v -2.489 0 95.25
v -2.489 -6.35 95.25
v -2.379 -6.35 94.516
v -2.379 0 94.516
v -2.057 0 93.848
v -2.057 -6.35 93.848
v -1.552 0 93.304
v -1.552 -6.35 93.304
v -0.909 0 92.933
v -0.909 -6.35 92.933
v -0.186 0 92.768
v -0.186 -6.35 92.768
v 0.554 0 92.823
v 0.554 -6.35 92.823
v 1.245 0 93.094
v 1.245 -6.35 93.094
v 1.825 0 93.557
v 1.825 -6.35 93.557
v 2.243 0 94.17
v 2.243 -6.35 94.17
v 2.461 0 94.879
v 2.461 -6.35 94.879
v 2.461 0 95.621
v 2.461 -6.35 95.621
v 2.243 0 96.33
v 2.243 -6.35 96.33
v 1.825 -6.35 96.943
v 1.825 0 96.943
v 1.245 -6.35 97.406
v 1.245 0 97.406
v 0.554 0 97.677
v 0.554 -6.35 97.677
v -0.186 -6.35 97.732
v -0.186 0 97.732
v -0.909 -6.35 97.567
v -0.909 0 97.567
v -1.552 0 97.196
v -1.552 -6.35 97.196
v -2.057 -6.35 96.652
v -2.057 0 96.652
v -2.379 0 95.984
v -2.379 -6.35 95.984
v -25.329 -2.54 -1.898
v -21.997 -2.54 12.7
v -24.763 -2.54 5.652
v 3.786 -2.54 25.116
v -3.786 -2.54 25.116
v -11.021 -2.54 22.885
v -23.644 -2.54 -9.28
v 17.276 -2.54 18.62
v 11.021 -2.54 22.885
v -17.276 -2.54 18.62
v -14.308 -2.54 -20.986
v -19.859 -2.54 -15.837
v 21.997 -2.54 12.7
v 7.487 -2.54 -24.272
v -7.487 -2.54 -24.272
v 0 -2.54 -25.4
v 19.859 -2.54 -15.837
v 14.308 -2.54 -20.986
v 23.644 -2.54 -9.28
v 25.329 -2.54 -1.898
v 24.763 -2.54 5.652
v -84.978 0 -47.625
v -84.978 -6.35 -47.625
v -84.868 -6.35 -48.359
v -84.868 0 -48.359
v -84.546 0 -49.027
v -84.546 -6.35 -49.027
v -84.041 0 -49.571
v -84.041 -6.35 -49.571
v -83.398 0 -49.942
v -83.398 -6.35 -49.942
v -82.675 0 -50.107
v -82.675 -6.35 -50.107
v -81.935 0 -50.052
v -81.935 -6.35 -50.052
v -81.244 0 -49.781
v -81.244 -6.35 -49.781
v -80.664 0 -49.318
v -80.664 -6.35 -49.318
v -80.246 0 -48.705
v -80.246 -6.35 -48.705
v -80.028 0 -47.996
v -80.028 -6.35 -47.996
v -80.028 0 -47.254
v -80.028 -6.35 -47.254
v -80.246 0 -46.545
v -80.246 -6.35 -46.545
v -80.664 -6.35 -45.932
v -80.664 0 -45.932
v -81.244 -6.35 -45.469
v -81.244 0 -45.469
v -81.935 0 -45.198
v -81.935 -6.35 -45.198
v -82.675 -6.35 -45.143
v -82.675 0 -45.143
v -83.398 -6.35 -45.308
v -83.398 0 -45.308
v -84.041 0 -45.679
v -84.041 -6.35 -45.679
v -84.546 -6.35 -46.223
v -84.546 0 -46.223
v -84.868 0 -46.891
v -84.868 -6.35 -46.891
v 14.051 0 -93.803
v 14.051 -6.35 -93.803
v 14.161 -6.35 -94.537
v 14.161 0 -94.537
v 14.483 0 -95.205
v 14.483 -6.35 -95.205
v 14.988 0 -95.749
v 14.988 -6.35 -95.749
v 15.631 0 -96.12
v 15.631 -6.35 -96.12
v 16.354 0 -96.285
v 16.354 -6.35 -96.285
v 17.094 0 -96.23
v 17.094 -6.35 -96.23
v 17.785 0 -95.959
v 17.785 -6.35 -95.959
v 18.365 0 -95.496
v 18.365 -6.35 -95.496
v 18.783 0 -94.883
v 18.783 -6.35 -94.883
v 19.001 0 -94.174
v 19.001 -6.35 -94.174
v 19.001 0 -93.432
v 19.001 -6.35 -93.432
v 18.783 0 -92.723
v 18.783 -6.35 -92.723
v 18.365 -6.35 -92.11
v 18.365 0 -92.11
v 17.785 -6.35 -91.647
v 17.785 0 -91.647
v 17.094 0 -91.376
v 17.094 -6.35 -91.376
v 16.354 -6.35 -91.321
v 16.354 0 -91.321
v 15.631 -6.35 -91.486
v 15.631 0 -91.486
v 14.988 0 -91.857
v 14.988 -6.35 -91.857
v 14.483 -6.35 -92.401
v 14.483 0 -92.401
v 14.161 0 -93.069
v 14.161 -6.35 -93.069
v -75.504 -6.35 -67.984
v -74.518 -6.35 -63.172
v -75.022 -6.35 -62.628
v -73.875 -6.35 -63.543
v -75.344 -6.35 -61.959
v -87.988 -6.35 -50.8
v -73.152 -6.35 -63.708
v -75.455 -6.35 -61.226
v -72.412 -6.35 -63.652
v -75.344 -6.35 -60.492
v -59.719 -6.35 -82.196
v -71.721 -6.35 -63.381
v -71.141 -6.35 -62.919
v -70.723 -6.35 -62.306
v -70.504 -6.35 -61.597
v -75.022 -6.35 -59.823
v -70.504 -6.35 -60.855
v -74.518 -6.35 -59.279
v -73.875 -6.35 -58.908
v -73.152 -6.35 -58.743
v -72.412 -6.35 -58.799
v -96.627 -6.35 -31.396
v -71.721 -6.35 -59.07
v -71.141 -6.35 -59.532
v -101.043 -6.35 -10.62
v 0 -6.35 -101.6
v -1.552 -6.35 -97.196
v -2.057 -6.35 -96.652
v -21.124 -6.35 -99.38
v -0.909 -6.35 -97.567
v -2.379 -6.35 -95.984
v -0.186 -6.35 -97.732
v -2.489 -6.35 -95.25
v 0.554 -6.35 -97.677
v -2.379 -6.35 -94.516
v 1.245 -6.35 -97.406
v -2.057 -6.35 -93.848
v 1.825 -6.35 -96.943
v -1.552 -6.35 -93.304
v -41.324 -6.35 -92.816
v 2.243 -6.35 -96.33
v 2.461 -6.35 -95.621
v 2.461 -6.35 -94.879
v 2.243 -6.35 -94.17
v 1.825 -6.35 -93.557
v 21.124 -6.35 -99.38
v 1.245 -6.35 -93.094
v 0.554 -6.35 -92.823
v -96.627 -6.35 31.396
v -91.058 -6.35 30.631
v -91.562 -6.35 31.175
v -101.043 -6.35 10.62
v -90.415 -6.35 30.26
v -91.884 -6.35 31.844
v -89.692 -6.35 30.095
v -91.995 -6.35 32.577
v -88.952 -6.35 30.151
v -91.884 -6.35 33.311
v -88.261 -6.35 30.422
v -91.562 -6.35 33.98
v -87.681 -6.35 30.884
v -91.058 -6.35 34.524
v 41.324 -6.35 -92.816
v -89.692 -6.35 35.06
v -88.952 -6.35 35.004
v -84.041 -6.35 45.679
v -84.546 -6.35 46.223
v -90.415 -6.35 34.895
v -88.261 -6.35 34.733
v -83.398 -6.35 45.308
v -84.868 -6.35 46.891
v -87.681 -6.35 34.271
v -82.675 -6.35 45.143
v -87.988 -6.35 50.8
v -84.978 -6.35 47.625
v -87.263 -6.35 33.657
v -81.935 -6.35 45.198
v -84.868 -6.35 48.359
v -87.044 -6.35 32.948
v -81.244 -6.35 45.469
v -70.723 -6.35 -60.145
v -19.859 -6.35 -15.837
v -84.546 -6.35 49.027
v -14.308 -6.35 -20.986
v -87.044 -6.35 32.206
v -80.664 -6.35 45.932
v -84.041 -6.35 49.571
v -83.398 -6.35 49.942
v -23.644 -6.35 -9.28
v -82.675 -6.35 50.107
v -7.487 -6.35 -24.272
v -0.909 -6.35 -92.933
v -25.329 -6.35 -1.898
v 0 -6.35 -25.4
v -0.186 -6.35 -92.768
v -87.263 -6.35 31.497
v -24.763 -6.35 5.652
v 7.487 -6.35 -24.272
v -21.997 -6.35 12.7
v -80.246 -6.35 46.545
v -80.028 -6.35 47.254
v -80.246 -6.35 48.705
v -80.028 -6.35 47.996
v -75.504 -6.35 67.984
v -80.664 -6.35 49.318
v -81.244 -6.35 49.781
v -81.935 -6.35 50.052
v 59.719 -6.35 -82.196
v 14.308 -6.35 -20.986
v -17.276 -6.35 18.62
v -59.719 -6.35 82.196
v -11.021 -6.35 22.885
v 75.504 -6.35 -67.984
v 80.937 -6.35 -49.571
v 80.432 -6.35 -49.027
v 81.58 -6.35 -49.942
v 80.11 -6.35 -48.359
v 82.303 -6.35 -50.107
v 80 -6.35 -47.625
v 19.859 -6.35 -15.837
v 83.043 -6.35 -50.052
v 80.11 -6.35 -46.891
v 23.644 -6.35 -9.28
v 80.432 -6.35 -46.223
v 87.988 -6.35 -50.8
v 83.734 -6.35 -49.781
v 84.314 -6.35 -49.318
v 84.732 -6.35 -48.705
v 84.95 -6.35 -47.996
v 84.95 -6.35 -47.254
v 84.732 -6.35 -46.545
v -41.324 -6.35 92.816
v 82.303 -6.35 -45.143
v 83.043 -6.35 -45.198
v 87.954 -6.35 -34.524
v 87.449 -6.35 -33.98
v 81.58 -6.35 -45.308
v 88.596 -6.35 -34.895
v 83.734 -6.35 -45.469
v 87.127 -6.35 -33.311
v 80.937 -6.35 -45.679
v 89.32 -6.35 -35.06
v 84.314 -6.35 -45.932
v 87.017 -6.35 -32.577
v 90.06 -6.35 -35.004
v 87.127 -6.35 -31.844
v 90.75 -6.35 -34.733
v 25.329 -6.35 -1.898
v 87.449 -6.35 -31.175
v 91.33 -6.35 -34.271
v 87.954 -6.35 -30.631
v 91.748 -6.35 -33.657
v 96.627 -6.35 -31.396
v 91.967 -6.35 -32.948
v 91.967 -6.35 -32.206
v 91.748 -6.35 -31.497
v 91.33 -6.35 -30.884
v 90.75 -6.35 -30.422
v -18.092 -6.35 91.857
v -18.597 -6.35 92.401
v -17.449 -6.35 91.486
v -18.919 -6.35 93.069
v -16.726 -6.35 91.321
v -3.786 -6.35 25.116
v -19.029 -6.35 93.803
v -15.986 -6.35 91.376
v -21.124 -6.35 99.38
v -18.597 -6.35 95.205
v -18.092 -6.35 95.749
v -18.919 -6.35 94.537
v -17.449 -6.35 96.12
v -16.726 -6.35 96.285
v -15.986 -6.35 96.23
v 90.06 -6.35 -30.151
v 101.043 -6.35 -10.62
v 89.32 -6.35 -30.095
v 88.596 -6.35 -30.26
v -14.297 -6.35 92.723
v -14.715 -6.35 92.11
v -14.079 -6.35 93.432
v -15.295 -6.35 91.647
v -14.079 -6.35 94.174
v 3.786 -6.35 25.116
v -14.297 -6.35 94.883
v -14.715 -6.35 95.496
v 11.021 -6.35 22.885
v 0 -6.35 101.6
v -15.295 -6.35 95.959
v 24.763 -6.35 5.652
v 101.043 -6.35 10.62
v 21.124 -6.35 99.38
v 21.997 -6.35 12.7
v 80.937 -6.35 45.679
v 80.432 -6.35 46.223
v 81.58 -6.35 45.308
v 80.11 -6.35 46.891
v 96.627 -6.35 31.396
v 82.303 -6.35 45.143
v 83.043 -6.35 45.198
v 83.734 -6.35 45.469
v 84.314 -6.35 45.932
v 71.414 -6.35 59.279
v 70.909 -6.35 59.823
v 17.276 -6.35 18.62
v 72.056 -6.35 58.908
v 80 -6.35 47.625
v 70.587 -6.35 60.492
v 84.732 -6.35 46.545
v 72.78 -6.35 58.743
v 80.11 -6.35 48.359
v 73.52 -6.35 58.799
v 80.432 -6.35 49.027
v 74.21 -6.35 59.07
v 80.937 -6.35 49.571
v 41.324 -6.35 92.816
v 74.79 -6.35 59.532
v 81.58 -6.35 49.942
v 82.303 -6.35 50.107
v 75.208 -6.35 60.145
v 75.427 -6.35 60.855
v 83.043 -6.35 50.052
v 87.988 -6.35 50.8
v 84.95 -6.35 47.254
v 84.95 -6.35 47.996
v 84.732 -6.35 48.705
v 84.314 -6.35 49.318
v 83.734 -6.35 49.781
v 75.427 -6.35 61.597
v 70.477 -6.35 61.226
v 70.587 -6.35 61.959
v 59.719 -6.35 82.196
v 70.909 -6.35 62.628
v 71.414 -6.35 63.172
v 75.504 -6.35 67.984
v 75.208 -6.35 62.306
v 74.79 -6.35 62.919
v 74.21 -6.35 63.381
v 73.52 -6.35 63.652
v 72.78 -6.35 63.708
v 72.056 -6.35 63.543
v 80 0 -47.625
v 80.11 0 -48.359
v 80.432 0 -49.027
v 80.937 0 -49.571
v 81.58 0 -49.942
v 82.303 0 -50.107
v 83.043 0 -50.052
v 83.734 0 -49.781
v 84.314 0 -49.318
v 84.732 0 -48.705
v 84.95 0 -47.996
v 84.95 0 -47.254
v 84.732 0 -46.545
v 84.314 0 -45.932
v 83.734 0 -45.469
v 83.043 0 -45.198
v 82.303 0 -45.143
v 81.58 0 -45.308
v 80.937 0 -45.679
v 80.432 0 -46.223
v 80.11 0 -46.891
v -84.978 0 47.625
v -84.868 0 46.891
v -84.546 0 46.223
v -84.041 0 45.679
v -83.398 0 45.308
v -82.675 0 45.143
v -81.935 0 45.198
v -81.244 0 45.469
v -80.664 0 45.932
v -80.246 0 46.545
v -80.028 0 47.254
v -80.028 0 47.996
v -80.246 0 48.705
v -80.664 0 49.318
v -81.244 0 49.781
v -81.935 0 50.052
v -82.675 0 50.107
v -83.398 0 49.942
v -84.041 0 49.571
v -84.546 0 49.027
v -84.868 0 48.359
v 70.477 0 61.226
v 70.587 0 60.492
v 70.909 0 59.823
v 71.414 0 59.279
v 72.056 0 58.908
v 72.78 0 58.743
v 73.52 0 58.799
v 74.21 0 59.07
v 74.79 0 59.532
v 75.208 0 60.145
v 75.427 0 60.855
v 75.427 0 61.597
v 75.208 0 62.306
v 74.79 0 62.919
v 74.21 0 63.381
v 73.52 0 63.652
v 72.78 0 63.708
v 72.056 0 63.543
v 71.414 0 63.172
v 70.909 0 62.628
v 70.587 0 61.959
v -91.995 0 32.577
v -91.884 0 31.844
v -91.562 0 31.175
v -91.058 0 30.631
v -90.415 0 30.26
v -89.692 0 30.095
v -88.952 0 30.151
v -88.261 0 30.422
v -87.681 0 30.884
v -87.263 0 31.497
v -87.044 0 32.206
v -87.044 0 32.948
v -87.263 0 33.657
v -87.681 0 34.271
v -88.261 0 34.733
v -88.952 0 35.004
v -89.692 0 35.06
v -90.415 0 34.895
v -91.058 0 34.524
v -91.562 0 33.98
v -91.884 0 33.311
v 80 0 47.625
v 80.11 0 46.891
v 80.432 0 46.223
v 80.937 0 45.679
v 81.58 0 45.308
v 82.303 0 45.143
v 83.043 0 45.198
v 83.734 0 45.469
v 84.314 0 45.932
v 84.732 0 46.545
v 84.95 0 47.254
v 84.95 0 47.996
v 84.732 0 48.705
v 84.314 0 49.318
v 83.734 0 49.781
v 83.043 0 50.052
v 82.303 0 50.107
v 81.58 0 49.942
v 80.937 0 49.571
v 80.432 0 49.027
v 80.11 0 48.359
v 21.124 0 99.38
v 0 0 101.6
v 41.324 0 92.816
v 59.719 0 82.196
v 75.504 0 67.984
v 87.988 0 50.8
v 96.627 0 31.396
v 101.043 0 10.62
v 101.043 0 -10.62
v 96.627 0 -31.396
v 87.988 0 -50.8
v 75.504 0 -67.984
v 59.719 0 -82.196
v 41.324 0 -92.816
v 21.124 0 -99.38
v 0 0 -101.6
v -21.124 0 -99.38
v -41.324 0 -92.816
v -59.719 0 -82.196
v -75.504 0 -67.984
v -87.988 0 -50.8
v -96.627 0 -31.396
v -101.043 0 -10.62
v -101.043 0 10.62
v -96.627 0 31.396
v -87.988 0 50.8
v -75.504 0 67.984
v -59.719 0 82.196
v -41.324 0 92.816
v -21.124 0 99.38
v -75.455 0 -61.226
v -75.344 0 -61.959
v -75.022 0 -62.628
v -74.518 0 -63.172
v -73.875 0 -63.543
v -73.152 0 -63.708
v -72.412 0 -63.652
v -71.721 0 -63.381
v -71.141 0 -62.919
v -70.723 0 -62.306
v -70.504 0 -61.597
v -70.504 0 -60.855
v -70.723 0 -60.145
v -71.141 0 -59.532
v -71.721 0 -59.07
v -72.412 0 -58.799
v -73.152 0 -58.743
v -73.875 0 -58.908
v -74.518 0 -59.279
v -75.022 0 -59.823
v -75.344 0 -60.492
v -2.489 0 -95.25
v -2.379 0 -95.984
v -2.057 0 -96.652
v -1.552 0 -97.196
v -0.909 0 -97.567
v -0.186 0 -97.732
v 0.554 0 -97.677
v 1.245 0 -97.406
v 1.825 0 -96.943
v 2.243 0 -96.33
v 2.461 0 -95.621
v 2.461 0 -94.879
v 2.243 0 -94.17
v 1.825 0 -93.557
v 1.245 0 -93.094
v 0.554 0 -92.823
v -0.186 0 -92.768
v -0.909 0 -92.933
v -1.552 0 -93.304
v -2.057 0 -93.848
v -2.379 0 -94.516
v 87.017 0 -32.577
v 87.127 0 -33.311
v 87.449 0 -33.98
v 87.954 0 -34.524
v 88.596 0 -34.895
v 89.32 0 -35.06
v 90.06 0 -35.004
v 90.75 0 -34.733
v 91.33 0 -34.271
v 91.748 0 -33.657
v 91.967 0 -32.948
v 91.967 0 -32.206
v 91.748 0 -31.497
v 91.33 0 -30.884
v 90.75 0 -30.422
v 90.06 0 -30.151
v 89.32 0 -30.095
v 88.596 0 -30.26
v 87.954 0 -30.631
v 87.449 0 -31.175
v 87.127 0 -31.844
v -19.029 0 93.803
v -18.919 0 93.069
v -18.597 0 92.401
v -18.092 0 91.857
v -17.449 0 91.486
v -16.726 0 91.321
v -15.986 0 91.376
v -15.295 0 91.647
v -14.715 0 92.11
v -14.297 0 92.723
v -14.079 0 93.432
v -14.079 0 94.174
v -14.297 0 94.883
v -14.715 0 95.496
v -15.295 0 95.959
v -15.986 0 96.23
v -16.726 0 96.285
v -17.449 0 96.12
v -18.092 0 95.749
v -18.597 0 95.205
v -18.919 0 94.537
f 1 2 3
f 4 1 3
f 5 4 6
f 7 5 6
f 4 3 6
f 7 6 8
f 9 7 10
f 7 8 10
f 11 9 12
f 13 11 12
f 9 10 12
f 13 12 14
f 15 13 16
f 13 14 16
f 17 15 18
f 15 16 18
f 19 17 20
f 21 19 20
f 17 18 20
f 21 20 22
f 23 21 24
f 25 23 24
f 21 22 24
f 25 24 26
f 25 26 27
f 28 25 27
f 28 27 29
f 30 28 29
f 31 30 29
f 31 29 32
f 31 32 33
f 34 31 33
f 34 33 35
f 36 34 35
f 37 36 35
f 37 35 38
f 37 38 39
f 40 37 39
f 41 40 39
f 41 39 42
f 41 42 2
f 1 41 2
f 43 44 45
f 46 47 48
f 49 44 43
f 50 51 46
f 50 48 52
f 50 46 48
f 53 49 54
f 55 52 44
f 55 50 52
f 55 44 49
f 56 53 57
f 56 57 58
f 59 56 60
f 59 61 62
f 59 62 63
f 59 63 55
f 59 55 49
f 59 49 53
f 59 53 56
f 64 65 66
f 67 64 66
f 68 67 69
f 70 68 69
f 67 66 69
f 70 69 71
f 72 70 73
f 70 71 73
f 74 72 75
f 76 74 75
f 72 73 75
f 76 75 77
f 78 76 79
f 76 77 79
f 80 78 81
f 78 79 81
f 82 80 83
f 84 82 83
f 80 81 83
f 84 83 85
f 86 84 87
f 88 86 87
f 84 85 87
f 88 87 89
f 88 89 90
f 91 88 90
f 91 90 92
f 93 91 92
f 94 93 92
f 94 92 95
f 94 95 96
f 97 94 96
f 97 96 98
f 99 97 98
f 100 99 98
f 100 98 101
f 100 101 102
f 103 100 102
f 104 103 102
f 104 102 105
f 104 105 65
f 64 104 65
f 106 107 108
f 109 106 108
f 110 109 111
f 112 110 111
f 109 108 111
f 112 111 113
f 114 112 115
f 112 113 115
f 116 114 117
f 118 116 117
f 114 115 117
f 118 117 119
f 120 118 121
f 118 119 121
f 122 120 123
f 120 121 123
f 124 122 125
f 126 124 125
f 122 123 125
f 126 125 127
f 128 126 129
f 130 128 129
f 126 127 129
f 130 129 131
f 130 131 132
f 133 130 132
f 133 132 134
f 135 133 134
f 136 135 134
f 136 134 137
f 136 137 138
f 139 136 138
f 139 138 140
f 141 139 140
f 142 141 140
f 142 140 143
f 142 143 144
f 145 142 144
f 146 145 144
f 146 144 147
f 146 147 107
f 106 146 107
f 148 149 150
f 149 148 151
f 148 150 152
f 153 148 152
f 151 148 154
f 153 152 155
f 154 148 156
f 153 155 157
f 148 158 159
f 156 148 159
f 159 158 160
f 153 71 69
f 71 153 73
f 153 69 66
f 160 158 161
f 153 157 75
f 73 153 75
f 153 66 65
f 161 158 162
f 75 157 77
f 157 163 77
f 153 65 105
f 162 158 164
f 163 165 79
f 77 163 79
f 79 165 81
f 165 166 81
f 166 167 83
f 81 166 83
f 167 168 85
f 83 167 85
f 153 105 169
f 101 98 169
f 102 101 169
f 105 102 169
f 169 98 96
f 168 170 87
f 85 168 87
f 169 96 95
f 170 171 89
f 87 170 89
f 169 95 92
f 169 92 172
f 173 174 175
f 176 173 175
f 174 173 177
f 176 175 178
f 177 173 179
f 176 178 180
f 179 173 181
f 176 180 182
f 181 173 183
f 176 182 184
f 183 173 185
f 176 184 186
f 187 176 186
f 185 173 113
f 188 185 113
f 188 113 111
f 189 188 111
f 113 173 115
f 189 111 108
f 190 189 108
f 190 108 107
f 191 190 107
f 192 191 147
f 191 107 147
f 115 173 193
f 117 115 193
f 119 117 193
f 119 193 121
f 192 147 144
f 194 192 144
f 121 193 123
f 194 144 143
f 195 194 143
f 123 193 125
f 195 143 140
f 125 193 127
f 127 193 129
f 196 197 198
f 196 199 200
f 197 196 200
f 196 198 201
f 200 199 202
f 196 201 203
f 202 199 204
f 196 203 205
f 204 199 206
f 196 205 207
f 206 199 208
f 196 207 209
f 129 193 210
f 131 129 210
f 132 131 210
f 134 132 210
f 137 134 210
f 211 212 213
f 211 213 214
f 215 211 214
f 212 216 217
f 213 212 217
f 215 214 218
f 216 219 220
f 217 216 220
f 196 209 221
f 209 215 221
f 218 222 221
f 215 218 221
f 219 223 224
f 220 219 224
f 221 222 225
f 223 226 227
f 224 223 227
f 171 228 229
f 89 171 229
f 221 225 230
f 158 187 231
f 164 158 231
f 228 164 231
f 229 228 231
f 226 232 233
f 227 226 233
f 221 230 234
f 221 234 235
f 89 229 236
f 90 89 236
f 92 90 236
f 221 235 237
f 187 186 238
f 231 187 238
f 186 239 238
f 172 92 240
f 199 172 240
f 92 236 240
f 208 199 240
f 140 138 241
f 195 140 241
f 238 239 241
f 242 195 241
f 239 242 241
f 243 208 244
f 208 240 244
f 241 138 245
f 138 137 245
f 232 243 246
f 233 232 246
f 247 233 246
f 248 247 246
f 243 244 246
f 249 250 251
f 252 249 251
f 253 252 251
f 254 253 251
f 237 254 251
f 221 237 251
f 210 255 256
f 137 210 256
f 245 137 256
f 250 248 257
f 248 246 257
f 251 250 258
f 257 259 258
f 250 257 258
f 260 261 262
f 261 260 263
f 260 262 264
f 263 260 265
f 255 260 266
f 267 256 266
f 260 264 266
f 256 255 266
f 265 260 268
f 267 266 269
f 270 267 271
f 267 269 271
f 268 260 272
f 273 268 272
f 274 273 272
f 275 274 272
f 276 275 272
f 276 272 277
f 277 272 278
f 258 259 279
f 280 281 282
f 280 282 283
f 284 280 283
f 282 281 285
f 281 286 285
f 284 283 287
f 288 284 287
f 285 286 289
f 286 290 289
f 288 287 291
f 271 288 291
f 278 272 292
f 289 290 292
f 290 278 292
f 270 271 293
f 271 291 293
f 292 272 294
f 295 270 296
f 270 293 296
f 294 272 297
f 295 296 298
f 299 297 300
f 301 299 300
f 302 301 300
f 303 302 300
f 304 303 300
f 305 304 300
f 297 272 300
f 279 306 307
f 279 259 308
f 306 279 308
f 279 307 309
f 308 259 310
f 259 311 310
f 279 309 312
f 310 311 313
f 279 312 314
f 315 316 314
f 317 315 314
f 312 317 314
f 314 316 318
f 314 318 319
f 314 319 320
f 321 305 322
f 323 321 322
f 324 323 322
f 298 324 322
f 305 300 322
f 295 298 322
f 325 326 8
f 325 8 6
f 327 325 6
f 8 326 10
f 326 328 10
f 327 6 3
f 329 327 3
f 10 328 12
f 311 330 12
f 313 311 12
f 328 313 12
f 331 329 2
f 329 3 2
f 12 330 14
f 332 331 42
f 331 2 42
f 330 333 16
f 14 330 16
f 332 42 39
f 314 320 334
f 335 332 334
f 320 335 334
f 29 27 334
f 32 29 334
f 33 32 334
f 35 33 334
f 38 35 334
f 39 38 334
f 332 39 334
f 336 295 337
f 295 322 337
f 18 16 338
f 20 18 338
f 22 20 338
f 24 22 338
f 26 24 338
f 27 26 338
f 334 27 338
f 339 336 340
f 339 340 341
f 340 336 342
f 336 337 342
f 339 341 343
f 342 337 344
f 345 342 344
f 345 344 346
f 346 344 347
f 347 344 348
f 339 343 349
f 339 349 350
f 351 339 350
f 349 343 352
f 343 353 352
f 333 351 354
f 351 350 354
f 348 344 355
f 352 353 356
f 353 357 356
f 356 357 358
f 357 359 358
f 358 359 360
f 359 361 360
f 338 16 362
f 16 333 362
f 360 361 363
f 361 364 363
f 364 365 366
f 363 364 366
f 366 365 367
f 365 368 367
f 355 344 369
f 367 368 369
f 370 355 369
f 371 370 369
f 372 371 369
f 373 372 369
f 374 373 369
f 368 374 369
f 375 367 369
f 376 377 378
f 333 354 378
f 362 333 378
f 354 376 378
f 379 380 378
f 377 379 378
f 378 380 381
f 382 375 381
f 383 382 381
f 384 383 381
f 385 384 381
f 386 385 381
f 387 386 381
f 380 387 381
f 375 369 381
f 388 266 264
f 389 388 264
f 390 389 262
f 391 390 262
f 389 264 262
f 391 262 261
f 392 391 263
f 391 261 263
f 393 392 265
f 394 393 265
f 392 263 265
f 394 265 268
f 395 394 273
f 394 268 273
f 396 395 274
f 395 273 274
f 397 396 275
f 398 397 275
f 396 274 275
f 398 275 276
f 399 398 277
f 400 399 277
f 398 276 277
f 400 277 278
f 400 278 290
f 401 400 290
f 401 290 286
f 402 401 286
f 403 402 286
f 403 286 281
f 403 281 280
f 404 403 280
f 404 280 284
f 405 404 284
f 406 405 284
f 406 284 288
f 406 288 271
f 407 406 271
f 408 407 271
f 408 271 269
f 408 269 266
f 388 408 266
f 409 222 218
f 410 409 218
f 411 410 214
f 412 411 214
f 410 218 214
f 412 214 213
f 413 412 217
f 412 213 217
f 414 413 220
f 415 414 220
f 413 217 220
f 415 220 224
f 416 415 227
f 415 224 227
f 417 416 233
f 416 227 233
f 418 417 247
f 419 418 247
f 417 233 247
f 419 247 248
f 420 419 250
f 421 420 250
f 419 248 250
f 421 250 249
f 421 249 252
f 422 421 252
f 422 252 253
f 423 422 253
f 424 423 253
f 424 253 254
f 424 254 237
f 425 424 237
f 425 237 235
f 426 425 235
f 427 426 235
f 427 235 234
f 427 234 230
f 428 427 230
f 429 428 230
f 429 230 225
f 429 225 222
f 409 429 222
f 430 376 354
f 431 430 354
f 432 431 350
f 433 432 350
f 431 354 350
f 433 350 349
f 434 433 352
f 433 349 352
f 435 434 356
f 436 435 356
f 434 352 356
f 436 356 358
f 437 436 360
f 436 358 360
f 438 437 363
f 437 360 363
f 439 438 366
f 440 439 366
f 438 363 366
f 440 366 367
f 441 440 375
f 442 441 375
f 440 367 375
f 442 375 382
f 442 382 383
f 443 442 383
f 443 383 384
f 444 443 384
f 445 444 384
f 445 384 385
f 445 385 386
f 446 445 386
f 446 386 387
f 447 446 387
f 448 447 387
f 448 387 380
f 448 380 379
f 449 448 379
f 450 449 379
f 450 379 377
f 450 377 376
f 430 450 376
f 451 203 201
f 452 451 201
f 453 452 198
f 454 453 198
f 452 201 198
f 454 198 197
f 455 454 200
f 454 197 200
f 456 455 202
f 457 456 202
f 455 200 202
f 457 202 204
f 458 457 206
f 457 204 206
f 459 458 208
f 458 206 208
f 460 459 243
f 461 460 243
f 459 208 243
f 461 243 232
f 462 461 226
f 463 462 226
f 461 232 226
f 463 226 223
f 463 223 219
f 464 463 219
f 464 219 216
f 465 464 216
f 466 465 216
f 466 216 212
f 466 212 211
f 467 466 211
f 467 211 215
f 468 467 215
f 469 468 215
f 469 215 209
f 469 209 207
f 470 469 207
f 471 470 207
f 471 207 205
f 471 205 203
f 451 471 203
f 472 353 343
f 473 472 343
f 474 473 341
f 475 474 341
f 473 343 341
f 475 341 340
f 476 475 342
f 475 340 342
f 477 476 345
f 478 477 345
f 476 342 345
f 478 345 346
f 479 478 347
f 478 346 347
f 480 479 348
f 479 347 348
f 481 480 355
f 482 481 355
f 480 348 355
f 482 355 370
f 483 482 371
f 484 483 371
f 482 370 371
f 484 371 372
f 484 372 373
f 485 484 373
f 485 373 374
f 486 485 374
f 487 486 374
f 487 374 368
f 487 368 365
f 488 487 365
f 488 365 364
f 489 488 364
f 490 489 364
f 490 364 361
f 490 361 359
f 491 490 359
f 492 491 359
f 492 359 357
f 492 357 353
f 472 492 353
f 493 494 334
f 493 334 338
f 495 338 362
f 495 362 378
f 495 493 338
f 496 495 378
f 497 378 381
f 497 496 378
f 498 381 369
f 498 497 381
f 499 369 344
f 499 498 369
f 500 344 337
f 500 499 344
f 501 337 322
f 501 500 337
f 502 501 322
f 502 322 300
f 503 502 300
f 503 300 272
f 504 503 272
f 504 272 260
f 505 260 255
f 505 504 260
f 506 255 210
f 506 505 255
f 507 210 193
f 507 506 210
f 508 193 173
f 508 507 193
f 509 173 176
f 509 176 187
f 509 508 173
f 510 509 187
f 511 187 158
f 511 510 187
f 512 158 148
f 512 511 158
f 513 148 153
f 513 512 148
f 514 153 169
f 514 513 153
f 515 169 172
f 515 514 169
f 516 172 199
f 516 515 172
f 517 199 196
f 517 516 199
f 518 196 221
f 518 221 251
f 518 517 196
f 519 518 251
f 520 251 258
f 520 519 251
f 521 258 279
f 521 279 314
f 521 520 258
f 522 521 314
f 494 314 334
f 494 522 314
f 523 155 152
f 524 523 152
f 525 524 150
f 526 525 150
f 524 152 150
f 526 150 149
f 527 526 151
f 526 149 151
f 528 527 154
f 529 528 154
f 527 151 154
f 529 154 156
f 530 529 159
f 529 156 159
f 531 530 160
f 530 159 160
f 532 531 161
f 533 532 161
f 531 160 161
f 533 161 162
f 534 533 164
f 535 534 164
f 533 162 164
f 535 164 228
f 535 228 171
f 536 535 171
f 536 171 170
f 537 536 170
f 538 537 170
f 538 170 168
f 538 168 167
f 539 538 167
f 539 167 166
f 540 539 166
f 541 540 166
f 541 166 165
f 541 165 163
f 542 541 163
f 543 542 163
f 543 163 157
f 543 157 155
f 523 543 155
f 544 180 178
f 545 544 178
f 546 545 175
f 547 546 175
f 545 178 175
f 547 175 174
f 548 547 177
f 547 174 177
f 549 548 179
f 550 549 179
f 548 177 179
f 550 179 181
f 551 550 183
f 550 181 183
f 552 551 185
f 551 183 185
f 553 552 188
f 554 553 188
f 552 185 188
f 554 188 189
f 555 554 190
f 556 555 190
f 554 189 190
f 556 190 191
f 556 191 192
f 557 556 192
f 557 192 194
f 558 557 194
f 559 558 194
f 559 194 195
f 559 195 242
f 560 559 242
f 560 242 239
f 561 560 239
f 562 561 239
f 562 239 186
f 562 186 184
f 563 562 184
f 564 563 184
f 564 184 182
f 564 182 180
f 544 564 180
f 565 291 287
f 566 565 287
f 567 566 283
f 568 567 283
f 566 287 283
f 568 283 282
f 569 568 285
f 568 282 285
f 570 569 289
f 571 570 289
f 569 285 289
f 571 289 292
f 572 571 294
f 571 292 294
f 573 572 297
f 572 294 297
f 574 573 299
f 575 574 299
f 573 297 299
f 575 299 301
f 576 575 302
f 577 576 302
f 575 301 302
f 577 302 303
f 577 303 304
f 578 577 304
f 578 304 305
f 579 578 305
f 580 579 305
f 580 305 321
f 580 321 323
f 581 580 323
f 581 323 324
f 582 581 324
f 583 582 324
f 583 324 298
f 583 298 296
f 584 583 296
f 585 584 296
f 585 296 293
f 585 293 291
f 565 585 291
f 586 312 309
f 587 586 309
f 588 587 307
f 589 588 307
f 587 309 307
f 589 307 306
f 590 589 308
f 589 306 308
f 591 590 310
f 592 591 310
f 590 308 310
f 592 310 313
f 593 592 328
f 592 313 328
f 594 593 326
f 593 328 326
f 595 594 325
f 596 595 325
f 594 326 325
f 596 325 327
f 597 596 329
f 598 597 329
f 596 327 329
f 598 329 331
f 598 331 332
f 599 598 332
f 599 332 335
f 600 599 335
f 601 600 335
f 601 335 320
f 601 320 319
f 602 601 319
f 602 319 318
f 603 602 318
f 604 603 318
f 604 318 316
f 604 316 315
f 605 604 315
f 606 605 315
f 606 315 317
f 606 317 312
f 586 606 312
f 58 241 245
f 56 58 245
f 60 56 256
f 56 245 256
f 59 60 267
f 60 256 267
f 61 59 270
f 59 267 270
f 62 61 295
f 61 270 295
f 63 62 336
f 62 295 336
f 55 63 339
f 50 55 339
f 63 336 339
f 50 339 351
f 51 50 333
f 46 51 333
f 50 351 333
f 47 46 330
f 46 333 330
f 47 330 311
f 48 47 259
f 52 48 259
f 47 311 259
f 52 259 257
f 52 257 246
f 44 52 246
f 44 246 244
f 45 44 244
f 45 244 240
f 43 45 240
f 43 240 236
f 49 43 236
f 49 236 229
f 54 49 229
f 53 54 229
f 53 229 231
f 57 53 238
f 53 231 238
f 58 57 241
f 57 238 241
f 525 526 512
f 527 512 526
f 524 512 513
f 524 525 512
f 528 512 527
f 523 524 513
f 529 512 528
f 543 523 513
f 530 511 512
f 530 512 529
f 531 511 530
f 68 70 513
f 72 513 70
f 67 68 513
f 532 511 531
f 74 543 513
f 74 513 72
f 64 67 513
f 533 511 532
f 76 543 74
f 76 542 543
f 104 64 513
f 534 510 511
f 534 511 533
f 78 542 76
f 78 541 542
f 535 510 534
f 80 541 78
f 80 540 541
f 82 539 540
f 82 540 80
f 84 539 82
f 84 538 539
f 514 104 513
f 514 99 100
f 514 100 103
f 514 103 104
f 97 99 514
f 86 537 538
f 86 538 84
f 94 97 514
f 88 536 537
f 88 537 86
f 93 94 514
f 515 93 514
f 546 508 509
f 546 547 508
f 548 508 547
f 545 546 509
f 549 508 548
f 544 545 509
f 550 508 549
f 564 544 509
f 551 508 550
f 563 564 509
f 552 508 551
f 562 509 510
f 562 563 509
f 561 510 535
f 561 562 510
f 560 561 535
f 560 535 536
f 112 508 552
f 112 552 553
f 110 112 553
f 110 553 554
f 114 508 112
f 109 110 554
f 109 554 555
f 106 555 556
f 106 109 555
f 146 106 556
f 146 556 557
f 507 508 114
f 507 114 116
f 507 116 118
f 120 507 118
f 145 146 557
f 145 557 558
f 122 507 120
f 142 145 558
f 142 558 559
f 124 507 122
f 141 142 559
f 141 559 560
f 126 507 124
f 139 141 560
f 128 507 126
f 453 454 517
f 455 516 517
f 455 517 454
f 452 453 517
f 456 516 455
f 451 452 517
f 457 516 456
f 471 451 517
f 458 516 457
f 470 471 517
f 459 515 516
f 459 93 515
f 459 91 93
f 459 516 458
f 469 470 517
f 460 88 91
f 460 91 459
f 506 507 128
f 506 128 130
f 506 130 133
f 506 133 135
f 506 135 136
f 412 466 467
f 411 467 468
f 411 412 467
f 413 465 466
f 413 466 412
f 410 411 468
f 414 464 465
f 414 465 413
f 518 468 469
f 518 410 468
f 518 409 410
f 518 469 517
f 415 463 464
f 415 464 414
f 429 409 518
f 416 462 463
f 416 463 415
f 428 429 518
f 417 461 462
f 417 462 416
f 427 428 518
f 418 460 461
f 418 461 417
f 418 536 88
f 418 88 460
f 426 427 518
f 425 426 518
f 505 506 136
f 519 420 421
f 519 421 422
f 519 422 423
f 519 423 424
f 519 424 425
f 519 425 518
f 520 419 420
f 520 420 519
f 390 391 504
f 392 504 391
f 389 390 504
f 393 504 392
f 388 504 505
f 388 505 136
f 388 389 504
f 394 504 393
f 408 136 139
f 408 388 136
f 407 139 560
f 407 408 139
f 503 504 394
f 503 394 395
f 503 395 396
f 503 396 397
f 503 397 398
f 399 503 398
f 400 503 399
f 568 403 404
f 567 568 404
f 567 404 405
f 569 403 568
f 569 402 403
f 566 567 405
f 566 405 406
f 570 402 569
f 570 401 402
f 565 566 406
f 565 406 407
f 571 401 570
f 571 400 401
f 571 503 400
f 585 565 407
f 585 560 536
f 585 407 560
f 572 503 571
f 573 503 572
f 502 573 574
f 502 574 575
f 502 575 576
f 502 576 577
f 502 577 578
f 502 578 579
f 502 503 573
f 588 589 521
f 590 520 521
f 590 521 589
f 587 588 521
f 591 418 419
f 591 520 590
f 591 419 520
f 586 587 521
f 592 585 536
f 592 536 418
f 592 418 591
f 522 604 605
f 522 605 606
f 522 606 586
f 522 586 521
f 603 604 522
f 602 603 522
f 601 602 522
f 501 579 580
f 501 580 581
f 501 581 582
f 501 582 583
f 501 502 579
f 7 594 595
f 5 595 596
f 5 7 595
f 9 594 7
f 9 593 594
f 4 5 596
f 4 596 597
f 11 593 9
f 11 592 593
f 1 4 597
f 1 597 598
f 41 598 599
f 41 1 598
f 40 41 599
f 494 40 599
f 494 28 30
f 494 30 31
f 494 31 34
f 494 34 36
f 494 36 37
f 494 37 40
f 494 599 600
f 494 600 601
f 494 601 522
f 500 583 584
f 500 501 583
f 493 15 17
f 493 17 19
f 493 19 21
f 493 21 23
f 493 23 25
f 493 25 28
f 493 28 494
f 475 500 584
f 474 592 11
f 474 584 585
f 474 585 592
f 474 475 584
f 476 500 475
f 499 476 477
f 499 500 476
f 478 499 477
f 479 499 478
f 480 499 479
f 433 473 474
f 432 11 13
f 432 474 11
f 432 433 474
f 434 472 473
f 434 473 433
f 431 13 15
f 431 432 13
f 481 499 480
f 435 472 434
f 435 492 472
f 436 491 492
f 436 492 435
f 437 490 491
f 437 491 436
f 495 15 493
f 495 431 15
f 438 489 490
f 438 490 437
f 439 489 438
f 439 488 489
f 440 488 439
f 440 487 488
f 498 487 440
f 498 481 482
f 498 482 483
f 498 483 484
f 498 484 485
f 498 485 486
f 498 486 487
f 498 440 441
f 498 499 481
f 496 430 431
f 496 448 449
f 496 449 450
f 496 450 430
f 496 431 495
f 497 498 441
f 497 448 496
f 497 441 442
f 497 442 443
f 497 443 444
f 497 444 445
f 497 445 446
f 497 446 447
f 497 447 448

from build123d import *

# Parameters (mm, degrees)
BACK_PLATE_MAIN_R          = 101.6
BOSS_EXTRUDE1_DEPTH        = 6.35
F_9_0_196_DIAMETER_HOLE1_D = 4.9784
CLEARANCE_CUTOUT_R         = 25.4
CUT_EXTRUDE1_DEPTH         = 3.81


with BuildPart() as part:
    # Back Plate Main → Boss-Extrude1 (new body)
    with BuildSketch(Plane(origin=(0, 0, 0), x_dir=(1, 0, 0), z_dir=(0, 1, 0))):
        with Locations(Location((0, 0, 0), (0, 0, 270))):
            Circle(BACK_PLATE_MAIN_R)
    extrude(amount=-BOSS_EXTRUDE1_DEPTH)

    # #9 (0.196) Diameter Hole1 (through all)
    with Locations(Plane(origin=(0, 0, 0), x_dir=(1, 0, 0), z_dir=(0, 1, 0))):
        with Locations((0, 95.25), (82.48891971, 47.625), (82.48891971, -47.625), (0, -95.25), (-82.48891971, -47.625), (-82.48891971, 47.625), (-72.965733207, 61.225519823), (16.539988923, 93.802938474), (89.50572213, 32.577418652), (72.965733207, -61.225519823), (-16.539988923, -93.802938474), (-89.50572213, -32.577418652)):
            Hole(F_9_0_196_DIAMETER_HOLE1_D / 2)

    # Clearance Cutout → Cut-Extrude1 (cut)
    with BuildSketch(Plane.XZ.offset(6.35)):
        with Locations(Location((0, 0, 0), (0, 0, 270))):
            Circle(CLEARANCE_CUTOUT_R)
    extrude(amount=-CUT_EXTRUDE1_DEPTH, mode=Mode.SUBTRACT)


solid = part.part
